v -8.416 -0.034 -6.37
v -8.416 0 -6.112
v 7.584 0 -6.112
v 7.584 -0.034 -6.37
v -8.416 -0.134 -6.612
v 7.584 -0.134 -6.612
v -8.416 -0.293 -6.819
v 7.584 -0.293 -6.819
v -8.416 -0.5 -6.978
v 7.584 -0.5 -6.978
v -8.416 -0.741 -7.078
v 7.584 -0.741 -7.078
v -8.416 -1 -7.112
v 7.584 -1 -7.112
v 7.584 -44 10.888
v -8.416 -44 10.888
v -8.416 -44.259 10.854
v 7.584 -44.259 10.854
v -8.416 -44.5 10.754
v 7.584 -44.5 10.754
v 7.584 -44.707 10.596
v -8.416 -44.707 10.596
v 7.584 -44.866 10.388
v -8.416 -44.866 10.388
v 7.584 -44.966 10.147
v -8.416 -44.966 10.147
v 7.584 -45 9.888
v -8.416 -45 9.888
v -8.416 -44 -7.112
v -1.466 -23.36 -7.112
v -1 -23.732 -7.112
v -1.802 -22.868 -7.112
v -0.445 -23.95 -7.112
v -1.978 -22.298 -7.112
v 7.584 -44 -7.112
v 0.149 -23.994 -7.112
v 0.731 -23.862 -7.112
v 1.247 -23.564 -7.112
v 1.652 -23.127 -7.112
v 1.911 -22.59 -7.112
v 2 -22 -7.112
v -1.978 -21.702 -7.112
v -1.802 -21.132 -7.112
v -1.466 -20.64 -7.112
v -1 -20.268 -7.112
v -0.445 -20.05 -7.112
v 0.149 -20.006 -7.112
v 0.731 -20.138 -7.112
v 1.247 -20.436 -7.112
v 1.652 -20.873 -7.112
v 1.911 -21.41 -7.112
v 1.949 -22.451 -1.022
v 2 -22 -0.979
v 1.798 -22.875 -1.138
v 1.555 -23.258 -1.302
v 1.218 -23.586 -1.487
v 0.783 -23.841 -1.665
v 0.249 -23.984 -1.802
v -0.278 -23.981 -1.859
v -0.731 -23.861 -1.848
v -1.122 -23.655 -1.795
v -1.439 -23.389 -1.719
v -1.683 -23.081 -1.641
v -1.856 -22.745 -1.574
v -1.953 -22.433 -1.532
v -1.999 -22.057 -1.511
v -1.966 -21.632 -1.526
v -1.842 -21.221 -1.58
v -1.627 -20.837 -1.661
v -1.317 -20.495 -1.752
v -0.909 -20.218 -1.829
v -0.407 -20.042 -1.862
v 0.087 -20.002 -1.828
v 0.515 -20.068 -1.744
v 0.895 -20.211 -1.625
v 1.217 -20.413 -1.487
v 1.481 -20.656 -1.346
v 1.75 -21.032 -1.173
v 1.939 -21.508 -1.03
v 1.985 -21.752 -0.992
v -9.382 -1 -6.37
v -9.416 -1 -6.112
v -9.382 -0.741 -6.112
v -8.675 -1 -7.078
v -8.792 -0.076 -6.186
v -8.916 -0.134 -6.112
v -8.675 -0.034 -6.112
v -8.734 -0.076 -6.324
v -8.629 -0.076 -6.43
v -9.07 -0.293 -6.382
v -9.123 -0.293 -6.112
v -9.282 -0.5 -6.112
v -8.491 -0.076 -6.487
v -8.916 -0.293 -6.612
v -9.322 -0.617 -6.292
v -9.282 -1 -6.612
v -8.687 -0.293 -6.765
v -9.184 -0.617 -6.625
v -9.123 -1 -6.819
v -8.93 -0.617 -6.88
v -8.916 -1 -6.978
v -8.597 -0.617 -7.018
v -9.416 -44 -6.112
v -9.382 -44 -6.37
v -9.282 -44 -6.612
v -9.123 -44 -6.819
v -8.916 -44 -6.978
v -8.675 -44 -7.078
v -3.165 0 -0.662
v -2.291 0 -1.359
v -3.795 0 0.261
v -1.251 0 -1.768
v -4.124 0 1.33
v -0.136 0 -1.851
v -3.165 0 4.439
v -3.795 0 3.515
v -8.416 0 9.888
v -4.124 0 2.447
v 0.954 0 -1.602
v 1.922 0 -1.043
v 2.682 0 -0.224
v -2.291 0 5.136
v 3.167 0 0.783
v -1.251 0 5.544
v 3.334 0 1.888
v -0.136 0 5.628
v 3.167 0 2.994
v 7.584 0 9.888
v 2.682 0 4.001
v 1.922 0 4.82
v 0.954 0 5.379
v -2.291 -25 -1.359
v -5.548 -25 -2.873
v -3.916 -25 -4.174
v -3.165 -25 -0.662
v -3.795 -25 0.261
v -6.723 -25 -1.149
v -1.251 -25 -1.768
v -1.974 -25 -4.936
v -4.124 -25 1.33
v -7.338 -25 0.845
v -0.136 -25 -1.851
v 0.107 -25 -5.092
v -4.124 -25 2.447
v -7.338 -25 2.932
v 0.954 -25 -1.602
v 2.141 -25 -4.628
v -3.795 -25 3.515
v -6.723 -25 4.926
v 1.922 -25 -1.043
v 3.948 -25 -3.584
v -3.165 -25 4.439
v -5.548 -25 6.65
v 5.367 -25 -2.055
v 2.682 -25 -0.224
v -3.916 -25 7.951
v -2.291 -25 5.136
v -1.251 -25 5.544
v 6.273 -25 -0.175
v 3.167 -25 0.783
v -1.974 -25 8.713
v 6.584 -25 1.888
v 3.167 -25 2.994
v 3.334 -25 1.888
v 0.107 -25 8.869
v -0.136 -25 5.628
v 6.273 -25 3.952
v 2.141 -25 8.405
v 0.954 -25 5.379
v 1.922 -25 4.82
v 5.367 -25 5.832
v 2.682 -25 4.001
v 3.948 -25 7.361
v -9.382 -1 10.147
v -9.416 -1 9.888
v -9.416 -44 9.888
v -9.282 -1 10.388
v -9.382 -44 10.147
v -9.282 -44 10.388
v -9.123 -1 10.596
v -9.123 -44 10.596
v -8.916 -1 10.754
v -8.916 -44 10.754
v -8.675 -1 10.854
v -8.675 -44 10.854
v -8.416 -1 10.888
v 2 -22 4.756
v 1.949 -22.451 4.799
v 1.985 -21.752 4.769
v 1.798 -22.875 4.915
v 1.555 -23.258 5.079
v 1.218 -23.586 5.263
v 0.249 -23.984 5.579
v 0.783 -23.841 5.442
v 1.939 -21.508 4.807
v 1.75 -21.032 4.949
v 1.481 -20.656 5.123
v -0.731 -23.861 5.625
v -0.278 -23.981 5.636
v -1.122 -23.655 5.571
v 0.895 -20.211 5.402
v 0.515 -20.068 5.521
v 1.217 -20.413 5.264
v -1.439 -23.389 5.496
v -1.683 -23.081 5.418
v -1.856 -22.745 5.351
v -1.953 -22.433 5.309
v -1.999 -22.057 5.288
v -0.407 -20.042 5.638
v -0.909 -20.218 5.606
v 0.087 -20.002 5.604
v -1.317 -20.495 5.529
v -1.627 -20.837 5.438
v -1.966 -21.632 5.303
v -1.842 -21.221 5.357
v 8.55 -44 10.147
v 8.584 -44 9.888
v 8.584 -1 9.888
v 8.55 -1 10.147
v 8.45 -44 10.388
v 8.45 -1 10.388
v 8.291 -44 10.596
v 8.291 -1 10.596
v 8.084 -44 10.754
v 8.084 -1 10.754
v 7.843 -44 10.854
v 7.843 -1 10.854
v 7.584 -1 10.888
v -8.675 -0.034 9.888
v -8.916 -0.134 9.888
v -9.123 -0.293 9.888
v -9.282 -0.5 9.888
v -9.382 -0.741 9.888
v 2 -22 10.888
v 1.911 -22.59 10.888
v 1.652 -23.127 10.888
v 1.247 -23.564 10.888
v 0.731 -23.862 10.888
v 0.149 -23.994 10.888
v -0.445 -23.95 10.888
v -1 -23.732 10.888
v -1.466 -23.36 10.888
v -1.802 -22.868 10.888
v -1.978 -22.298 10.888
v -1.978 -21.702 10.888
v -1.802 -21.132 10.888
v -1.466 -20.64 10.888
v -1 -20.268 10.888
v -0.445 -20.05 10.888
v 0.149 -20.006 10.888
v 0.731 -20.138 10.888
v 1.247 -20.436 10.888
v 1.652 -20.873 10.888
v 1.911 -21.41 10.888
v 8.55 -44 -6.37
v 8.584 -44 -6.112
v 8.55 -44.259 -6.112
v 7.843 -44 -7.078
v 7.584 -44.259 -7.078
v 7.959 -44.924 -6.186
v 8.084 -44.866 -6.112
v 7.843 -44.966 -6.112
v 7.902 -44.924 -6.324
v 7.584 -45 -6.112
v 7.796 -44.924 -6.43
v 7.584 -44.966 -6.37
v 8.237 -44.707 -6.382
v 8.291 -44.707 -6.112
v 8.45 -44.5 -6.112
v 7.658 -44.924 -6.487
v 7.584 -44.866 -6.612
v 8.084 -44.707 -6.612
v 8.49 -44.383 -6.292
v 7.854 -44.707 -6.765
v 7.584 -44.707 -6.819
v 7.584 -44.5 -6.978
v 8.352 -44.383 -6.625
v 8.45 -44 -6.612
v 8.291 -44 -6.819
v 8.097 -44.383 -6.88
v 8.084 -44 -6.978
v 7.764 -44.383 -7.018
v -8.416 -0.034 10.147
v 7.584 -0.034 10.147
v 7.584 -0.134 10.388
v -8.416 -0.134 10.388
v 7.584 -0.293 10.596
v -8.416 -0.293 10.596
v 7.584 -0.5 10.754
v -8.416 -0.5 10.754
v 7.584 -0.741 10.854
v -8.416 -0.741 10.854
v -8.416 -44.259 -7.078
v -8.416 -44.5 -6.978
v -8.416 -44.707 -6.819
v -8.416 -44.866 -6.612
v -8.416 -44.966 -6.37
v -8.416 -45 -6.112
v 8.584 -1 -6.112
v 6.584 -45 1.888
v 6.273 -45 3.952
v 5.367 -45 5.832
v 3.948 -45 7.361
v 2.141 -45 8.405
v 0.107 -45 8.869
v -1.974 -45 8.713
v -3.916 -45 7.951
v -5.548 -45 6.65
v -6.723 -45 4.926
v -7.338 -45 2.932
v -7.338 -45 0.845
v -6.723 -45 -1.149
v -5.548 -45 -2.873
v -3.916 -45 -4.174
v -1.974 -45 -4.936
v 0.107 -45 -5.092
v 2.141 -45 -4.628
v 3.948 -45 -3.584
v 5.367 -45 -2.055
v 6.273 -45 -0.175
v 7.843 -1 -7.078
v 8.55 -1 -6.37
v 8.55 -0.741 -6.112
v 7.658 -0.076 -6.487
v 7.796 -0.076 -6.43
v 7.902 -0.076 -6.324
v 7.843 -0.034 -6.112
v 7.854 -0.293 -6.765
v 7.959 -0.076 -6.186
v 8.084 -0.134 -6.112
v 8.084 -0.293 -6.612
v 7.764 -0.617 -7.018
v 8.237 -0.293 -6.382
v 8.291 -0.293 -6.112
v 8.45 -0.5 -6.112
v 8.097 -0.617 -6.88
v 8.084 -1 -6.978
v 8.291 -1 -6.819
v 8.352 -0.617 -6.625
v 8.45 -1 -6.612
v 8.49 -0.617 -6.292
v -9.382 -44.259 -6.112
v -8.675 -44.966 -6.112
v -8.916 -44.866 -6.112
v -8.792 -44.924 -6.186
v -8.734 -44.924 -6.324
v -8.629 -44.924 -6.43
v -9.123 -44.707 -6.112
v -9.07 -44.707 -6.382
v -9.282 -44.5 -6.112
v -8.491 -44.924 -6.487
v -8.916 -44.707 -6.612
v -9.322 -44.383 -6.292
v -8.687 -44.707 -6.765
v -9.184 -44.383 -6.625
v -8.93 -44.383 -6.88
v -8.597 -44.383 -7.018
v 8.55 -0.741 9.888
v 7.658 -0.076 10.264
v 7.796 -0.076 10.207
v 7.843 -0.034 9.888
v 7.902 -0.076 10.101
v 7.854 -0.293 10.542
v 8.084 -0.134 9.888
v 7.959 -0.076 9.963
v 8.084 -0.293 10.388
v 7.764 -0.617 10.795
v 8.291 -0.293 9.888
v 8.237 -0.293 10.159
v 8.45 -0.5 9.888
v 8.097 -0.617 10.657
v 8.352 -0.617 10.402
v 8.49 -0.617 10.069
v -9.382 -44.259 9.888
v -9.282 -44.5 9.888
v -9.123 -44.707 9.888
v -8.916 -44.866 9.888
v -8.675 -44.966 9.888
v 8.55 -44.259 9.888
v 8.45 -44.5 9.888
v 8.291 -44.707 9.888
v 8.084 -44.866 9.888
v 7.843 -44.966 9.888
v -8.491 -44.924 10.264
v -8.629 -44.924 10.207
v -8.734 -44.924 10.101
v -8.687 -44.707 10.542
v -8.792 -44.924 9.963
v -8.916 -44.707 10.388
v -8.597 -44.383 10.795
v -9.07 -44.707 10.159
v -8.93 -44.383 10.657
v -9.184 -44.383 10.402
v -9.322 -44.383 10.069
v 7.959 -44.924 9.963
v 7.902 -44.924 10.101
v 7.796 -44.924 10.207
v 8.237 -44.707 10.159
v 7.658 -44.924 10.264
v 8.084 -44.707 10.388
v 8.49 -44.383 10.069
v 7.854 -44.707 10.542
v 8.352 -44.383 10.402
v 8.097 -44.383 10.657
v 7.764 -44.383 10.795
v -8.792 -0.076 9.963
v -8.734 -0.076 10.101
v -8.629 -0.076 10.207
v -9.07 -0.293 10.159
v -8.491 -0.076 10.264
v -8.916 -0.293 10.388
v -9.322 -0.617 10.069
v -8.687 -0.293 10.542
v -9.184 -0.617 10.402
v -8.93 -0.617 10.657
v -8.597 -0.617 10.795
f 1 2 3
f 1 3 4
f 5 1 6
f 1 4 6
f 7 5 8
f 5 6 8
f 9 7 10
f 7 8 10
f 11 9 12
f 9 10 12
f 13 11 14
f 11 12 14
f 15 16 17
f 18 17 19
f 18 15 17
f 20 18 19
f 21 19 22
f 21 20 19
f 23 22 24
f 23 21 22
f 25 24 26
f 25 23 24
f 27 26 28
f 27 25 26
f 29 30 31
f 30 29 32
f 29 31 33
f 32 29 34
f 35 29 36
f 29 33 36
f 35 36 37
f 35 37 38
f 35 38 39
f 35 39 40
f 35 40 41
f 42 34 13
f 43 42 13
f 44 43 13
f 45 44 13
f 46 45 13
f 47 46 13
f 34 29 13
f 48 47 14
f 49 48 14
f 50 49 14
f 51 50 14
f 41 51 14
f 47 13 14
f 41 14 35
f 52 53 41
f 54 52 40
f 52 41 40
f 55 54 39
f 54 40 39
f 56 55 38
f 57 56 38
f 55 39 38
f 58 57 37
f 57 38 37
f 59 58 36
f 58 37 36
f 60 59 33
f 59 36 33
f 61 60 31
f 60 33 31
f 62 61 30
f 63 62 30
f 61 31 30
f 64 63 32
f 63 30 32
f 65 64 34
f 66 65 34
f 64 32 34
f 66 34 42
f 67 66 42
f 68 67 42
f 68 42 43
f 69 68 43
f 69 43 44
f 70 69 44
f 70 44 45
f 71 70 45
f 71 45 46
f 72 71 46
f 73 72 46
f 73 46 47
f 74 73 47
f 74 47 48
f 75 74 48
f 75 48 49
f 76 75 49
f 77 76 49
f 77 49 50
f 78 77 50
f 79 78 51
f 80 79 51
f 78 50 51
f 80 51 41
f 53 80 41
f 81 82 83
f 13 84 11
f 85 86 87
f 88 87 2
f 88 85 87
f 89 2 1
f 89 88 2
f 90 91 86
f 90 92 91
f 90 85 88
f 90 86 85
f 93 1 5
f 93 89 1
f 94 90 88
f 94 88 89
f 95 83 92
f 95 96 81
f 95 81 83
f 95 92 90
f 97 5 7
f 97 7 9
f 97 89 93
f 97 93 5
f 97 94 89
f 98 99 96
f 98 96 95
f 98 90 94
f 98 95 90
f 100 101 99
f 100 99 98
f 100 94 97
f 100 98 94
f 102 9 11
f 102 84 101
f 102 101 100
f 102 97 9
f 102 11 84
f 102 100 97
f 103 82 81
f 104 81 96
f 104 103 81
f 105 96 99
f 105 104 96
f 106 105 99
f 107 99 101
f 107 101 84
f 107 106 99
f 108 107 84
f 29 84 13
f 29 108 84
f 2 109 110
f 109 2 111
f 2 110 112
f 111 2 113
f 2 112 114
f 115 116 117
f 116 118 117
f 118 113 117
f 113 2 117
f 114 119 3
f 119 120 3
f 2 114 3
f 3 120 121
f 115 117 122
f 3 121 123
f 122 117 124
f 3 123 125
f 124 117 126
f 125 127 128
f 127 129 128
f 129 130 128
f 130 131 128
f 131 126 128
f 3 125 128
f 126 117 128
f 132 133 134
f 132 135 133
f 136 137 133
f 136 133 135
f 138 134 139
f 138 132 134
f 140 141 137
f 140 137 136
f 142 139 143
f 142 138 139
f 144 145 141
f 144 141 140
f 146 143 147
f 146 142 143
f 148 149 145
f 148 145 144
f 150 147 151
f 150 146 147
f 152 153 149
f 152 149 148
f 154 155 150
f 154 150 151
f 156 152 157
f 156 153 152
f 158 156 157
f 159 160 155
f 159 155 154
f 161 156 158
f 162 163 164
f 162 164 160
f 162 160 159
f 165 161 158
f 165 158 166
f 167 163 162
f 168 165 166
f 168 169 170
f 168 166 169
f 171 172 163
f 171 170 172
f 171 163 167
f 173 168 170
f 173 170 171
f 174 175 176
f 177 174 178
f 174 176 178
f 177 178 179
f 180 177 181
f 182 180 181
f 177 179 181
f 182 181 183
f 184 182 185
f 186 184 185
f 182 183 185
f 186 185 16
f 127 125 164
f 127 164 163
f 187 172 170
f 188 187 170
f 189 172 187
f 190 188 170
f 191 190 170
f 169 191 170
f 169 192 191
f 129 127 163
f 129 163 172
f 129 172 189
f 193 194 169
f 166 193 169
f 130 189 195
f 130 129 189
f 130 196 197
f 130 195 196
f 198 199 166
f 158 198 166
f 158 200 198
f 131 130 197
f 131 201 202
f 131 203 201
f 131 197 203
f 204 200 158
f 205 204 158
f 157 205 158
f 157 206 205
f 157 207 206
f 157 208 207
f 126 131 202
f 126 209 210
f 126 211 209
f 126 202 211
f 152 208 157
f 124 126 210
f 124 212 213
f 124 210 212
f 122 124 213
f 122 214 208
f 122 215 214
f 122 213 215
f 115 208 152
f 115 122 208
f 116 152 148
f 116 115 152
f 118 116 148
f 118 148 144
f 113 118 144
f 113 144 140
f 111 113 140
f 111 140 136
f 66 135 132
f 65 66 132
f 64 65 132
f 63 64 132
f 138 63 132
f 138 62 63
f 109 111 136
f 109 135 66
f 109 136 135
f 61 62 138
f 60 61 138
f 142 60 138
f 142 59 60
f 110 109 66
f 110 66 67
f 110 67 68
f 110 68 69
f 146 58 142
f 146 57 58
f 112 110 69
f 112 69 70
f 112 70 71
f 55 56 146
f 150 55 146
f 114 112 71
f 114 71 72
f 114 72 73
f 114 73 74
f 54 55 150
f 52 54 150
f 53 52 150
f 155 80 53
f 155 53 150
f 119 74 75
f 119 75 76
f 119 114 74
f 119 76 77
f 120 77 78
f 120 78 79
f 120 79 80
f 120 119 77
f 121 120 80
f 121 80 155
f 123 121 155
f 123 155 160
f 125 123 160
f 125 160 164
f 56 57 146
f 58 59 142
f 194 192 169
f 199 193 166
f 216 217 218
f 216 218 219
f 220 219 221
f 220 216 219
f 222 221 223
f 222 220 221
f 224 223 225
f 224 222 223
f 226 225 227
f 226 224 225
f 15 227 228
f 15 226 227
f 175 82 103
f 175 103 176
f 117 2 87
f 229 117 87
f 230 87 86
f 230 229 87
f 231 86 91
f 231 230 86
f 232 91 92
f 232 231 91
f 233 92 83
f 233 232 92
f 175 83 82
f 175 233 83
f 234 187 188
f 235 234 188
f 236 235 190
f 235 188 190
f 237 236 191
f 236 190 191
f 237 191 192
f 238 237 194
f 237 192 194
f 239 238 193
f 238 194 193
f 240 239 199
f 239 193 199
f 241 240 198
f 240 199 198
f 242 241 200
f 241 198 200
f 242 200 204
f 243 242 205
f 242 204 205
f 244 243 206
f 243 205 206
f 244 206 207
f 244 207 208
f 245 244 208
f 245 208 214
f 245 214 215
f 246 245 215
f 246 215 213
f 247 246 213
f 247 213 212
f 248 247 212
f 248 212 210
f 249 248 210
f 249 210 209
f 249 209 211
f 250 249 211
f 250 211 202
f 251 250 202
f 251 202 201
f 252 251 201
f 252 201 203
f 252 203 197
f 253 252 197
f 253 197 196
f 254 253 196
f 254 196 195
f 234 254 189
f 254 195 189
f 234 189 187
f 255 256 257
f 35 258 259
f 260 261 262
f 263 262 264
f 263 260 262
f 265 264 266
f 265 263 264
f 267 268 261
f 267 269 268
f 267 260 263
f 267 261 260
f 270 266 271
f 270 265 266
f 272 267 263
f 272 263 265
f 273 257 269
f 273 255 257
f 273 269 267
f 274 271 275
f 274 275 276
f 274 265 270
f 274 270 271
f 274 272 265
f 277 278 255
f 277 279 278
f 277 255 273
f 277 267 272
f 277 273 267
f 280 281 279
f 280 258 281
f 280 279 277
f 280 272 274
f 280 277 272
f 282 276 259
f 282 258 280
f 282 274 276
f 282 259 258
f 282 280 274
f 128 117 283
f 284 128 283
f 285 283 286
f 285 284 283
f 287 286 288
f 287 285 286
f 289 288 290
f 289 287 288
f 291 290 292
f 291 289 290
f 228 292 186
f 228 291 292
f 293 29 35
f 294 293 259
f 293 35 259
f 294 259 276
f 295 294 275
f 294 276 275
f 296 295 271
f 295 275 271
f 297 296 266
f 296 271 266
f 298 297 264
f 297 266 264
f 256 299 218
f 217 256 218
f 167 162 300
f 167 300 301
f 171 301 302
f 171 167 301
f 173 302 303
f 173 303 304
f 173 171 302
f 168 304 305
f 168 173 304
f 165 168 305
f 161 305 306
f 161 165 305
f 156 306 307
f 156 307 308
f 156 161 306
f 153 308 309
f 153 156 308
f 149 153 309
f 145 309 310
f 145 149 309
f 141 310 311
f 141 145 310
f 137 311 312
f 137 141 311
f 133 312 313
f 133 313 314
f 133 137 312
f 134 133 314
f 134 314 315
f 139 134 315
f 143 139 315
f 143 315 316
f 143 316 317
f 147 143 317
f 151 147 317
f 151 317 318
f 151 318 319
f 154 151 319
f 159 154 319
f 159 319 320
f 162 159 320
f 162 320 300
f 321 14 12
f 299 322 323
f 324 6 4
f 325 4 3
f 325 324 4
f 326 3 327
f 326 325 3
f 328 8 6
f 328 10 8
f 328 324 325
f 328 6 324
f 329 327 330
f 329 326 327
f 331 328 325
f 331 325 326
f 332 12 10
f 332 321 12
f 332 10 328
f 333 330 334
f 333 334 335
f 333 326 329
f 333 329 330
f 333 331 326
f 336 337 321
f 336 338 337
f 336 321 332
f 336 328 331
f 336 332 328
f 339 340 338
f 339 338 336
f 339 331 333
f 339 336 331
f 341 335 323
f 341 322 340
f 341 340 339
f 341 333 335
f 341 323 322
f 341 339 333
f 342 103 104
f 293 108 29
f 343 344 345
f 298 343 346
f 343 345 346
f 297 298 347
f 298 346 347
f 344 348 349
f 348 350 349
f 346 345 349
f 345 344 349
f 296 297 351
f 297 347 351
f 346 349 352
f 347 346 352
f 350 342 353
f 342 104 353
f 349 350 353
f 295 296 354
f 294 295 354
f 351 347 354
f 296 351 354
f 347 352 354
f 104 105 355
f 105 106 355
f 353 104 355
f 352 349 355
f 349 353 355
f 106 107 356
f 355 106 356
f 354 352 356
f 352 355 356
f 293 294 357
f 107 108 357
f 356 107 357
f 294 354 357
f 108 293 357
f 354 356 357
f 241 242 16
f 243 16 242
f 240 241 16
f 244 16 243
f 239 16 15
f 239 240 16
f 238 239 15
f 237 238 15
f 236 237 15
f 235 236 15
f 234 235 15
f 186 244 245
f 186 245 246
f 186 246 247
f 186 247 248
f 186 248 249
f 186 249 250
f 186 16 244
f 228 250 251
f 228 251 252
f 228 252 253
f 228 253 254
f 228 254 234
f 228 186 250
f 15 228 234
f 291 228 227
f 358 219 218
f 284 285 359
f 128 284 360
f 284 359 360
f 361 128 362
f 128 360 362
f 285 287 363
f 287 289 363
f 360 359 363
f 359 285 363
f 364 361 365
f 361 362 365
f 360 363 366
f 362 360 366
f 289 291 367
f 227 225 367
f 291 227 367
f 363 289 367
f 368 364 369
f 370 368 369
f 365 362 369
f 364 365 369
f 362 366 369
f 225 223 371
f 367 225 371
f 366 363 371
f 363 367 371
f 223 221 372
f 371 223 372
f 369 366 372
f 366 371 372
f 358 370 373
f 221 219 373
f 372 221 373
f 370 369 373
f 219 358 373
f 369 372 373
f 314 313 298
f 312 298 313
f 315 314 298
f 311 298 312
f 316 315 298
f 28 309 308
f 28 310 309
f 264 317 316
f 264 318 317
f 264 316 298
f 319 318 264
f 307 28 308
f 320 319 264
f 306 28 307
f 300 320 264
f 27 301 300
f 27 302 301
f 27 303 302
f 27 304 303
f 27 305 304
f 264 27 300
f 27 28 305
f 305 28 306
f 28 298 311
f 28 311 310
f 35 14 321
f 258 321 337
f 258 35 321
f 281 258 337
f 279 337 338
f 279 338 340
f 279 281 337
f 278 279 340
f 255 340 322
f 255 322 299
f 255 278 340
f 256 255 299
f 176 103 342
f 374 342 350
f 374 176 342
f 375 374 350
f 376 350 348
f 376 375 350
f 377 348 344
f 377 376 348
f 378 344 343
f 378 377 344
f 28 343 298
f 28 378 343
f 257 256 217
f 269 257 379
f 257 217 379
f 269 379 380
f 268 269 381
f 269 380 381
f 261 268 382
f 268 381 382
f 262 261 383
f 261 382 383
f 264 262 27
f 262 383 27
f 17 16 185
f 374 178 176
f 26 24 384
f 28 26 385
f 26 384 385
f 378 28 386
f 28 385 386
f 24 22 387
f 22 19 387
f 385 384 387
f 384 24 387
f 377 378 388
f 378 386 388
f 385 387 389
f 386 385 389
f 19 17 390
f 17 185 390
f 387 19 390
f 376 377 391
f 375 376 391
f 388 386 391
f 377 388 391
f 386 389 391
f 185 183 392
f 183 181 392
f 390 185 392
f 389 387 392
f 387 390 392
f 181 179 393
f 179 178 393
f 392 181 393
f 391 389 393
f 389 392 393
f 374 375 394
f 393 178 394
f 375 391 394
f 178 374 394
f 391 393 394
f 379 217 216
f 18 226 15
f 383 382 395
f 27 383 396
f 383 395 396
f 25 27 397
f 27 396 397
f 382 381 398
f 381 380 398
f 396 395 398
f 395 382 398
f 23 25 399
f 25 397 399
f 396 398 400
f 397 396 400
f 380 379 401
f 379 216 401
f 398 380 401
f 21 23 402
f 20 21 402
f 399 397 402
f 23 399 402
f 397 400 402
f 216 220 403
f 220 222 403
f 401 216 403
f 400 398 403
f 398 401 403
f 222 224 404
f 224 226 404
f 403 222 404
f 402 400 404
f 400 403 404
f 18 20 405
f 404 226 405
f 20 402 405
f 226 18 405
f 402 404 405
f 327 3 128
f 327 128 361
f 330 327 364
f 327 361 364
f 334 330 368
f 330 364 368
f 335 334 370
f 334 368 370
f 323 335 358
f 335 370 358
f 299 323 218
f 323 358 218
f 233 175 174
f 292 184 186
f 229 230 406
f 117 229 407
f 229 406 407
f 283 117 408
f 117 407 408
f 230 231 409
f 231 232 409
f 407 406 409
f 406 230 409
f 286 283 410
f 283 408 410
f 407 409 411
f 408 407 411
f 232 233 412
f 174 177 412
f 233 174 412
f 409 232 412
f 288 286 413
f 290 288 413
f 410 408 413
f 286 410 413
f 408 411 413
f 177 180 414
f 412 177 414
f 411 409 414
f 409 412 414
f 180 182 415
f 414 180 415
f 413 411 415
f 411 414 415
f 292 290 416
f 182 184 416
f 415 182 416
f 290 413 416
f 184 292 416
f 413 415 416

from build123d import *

# Parameters (mm, degrees)
F0_W     = 18
F0_H     = 18
F0_R     = 7
F1_DEPTH = 45
F0_R_2   = 3.75
F2_DEPTH = 25
F3_R     = 2
F4_DEPTH = 25
F5_R     = 1


with BuildPart() as f1:
    # F0 (on Front) → F1 (new body)
    with BuildSketch(Plane.XZ):
        with Locations((-0.41628, 1.888414)):
            Rectangle(F0_W, F0_H)
        with Locations((-0.41628, 1.888414)):
            Circle(F0_R, mode=Mode.SUBTRACT)
    extrude(amount=F1_DEPTH)

    # F0 (on Front) → F2 (join)
    with BuildSketch(Plane.XZ):
        with Locations((-0.41628, 1.888414)):
            Circle(F0_R)
        with Locations((-0.41628, 1.888414)):
            Circle(F0_R_2, mode=Mode.SUBTRACT)
    extrude(amount=F2_DEPTH)

    # F3 (on face) → F4 (cut)
    with BuildSketch(Plane(origin=(0, 0, -7.111586), x_dir=(1, 0, 0), z_dir=(0, 0, -1))):
        with Locations((0, 22)):
            Circle(F3_R)
    extrude(amount=-F4_DEPTH, mode=Mode.SUBTRACT)

    # F5
    f5_edges = [f1.edges().sort_by_distance(p)[0] for p in [
        (-9.41628, -22.5, -7.111586),
        (8.58372, -22.5, -7.111586),
        (-9.41628, -22.5, 10.888414),
        (8.58372, -22.5, 10.888414),
        (-9.41628, 0, 1.888414),
        (-0.41628, 0, 10.888414),
        (-0.41628, 0, -7.111586),
        (8.58372, 0, 1.888414),
        (8.58372, -45, 1.888414),
        (-0.41628, -45, 10.888414),
        (-9.41628, -45, 1.888414),
        (-0.41628, -45, -7.111586),
    ]]
    fillet(f5_edges, radius=F5_R)


solid = f1.part
